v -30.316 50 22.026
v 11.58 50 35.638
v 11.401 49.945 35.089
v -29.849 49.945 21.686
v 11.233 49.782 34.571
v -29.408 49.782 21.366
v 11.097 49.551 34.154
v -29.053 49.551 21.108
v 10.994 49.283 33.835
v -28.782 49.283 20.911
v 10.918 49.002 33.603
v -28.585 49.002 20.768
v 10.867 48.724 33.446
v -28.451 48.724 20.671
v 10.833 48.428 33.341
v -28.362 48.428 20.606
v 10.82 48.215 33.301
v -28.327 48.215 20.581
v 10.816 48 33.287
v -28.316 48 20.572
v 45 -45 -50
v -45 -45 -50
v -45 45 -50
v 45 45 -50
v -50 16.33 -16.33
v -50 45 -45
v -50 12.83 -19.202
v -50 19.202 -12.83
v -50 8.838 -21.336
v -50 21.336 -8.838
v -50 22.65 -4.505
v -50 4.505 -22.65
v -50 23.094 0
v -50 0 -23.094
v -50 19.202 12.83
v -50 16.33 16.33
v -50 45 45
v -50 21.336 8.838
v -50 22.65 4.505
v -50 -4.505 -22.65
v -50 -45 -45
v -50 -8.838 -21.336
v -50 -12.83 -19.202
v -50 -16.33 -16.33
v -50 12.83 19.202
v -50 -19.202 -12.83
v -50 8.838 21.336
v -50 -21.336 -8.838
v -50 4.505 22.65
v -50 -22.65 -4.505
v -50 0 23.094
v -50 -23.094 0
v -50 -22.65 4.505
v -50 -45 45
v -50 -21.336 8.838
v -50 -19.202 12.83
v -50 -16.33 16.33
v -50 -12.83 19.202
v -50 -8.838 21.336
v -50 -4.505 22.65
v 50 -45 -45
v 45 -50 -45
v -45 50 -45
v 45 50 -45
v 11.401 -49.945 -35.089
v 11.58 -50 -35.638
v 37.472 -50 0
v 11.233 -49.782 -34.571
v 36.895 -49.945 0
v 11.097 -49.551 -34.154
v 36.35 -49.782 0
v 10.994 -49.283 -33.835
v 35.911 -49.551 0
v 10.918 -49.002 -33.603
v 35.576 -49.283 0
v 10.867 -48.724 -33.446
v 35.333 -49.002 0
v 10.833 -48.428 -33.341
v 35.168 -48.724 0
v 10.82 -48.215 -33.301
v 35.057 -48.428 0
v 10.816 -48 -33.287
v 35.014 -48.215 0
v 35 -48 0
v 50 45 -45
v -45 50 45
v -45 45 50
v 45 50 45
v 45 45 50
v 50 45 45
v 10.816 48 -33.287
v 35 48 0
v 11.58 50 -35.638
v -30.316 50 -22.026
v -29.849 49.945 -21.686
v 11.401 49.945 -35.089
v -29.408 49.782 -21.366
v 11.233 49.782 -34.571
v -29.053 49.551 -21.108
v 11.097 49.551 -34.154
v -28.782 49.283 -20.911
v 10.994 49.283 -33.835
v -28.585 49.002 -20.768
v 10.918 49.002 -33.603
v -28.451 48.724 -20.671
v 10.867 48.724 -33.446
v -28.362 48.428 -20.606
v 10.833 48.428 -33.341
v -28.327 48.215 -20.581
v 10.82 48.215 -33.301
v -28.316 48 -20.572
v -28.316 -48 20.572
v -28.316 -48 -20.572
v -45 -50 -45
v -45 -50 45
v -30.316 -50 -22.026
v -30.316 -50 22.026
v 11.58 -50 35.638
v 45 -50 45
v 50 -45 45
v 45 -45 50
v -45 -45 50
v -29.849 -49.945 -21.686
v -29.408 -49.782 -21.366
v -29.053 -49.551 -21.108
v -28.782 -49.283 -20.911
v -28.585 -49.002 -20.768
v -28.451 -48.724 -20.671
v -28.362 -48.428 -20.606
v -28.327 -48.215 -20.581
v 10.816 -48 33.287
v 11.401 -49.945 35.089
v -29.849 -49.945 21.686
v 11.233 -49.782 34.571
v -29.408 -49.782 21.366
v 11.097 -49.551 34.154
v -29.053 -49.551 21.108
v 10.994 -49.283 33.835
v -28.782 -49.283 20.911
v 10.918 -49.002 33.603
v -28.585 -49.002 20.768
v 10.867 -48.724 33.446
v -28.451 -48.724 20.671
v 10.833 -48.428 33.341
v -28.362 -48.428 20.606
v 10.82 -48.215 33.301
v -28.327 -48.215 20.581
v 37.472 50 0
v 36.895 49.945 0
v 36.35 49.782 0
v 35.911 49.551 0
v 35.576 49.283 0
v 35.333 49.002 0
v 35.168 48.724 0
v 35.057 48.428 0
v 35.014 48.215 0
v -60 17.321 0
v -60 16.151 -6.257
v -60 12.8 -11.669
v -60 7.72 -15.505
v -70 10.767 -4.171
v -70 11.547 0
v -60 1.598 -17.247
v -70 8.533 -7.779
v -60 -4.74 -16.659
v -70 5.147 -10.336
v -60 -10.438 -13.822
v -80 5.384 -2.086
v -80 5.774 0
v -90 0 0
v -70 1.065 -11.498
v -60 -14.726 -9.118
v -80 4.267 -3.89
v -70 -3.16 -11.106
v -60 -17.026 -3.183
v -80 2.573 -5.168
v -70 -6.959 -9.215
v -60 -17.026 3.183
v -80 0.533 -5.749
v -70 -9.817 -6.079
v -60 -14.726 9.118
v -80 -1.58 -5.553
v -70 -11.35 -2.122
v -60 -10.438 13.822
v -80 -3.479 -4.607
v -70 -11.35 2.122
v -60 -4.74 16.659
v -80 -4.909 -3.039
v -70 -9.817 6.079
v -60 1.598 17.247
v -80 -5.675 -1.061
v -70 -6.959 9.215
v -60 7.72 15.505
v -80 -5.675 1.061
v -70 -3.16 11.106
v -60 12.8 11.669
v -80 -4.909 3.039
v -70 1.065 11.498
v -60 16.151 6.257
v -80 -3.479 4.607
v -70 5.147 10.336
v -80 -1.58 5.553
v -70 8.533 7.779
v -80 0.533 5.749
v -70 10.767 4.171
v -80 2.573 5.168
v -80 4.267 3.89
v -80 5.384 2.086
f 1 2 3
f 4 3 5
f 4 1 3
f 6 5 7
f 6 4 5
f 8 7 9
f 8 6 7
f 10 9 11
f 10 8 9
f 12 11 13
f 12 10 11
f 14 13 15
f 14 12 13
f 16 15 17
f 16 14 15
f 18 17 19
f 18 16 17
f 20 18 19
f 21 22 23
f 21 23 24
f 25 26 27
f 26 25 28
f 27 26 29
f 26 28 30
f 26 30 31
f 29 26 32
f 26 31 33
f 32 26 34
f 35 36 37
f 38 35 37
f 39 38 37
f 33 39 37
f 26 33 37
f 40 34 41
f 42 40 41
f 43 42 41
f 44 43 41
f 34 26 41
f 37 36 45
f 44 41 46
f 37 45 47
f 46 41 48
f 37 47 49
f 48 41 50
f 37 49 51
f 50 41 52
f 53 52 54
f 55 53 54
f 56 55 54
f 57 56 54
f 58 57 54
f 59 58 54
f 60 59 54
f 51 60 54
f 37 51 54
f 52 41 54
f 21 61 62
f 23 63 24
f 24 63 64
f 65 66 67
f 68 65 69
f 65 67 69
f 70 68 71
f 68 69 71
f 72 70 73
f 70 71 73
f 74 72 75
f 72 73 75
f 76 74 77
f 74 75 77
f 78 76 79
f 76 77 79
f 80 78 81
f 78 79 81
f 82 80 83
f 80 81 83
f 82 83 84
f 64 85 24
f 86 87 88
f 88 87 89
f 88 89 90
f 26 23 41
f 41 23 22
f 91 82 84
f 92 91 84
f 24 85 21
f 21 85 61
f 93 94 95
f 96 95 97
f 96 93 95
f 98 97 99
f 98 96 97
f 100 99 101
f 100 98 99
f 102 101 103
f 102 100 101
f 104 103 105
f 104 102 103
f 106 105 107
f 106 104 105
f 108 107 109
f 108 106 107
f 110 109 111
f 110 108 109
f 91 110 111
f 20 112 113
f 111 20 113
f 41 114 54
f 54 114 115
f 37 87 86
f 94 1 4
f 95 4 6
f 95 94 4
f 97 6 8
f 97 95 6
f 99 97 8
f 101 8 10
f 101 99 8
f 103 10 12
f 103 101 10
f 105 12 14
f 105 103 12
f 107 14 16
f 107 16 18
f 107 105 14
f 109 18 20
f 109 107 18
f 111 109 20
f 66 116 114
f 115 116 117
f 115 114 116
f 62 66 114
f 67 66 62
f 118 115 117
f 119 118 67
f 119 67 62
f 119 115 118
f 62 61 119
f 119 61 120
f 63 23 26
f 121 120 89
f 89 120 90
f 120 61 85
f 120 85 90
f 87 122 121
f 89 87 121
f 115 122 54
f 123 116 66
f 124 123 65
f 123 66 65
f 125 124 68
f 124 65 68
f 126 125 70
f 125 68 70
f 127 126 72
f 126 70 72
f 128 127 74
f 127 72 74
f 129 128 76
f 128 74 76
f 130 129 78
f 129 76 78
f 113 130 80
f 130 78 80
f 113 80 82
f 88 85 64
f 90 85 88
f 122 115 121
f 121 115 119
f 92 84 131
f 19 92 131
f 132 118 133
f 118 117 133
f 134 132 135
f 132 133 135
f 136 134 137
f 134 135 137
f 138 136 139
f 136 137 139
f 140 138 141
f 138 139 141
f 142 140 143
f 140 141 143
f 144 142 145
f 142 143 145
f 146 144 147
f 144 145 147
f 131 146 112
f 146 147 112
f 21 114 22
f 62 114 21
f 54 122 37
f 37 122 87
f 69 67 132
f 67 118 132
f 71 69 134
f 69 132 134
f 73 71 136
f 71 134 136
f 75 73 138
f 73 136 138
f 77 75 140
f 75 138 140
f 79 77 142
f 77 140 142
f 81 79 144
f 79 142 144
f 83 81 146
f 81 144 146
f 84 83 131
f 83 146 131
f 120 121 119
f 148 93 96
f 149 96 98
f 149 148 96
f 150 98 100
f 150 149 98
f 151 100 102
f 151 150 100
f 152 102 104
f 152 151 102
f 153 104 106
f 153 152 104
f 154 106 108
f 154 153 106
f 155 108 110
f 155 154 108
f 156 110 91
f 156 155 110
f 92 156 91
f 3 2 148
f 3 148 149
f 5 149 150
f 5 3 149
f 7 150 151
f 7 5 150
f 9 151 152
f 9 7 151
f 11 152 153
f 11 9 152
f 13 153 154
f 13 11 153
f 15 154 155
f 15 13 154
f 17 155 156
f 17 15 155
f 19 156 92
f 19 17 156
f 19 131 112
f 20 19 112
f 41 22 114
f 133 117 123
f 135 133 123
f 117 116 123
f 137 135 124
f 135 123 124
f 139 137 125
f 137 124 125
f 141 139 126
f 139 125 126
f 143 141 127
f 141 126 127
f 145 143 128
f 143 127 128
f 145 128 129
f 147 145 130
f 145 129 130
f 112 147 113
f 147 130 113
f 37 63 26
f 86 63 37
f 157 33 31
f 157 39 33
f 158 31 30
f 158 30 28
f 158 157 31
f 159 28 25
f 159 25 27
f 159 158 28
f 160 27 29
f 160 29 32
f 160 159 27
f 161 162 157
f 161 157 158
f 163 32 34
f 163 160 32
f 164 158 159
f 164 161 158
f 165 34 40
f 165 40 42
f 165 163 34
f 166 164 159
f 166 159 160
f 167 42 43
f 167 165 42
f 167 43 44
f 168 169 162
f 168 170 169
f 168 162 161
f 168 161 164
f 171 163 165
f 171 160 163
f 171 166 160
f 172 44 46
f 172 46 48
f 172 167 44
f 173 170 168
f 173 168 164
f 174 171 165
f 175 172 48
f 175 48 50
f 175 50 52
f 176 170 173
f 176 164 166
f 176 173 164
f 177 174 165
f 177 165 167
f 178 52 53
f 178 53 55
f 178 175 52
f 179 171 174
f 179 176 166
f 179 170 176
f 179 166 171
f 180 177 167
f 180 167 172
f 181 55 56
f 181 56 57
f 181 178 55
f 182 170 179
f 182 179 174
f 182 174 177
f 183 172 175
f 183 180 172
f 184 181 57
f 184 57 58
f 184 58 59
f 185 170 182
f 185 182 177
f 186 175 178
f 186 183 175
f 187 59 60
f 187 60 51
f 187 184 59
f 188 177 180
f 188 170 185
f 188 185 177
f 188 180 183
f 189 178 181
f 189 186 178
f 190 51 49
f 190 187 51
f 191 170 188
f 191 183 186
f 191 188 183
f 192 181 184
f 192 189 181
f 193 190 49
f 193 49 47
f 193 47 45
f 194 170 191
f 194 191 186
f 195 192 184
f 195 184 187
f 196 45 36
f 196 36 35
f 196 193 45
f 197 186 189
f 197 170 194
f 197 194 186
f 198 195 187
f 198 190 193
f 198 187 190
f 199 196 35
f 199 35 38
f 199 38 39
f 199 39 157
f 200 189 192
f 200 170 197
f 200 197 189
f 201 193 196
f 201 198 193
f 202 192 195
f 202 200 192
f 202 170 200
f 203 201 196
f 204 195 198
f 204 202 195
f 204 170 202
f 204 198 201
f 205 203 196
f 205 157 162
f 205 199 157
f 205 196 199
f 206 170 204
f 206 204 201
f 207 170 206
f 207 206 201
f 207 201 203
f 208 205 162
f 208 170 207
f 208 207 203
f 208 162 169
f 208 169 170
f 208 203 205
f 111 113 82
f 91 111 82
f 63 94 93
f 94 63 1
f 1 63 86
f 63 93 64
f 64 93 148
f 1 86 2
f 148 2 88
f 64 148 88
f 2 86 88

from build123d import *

# Parameters (mm, degrees)
F0_W     = 100
F0_H     = 100
F1_DEPTH = 50
F3_DEPTH = 142.9
F4_SIZE  = 5
F5_R     = 2


with BuildPart() as f1:
    # F0 (on Front) → F1 (new body, symmetric)
    with BuildSketch(Plane.XZ):
        Rectangle(F0_W, F0_H)
    extrude(amount=F1_DEPTH, both=True)

    # F2 (on face) → F3 (cut)
    with BuildSketch(Plane.XZ.offset(50)):
        Polygon((10.815595, -33.286978), (35, 0), (10.815595, 33.286978), (-28.315595, 20.572484), (-28.315595, -20.572484), align=None)
    extrude(amount=-F3_DEPTH, mode=Mode.SUBTRACT)

    # F4
    f4_edges = [f1.edges().sort_by_distance(p)[0] for p in [
        (50, 0, 50),
        (0, 50, 50),
        (-50, 0, 50),
        (0, -50, 50),
        (50, 50, 0),
        (50, -50, 0),
        (50, 0, -50),
        (0, 50, -50),
        (0, -50, -50),
        (-50, 0, -50),
        (-50, 50, 0),
        (-50, -50, 0),
    ]]
    chamfer(f4_edges, length=F4_SIZE)

    # F5
    f5_edges = [f1.edges().sort_by_distance(p)[0] for p in [
        (22.907797, 50, -16.643489),
        (-8.75, 50, -26.929731),
        (-28.315595, 50, 0),
        (-8.75, 50, 26.929731),
        (22.907797, 50, 16.643489),
        (22.907797, -50, -16.643489),
        (22.907797, -50, 16.643489),
        (-8.75, -50, 26.929731),
        (-28.315595, -50, 0),
        (-8.75, -50, -26.929731),
    ]]
    fillet(f5_edges, radius=F5_R)

    # F6 (on Top) → F7 (revolve)
    with BuildSketch(Plane.XY):
        Polygon((-90, 0), (-50, 0), (-50, 23.094011), align=None)
    revolve(axis=Axis((-70, 0, 0), (-1, 0, 0)))


solid = f1.part
